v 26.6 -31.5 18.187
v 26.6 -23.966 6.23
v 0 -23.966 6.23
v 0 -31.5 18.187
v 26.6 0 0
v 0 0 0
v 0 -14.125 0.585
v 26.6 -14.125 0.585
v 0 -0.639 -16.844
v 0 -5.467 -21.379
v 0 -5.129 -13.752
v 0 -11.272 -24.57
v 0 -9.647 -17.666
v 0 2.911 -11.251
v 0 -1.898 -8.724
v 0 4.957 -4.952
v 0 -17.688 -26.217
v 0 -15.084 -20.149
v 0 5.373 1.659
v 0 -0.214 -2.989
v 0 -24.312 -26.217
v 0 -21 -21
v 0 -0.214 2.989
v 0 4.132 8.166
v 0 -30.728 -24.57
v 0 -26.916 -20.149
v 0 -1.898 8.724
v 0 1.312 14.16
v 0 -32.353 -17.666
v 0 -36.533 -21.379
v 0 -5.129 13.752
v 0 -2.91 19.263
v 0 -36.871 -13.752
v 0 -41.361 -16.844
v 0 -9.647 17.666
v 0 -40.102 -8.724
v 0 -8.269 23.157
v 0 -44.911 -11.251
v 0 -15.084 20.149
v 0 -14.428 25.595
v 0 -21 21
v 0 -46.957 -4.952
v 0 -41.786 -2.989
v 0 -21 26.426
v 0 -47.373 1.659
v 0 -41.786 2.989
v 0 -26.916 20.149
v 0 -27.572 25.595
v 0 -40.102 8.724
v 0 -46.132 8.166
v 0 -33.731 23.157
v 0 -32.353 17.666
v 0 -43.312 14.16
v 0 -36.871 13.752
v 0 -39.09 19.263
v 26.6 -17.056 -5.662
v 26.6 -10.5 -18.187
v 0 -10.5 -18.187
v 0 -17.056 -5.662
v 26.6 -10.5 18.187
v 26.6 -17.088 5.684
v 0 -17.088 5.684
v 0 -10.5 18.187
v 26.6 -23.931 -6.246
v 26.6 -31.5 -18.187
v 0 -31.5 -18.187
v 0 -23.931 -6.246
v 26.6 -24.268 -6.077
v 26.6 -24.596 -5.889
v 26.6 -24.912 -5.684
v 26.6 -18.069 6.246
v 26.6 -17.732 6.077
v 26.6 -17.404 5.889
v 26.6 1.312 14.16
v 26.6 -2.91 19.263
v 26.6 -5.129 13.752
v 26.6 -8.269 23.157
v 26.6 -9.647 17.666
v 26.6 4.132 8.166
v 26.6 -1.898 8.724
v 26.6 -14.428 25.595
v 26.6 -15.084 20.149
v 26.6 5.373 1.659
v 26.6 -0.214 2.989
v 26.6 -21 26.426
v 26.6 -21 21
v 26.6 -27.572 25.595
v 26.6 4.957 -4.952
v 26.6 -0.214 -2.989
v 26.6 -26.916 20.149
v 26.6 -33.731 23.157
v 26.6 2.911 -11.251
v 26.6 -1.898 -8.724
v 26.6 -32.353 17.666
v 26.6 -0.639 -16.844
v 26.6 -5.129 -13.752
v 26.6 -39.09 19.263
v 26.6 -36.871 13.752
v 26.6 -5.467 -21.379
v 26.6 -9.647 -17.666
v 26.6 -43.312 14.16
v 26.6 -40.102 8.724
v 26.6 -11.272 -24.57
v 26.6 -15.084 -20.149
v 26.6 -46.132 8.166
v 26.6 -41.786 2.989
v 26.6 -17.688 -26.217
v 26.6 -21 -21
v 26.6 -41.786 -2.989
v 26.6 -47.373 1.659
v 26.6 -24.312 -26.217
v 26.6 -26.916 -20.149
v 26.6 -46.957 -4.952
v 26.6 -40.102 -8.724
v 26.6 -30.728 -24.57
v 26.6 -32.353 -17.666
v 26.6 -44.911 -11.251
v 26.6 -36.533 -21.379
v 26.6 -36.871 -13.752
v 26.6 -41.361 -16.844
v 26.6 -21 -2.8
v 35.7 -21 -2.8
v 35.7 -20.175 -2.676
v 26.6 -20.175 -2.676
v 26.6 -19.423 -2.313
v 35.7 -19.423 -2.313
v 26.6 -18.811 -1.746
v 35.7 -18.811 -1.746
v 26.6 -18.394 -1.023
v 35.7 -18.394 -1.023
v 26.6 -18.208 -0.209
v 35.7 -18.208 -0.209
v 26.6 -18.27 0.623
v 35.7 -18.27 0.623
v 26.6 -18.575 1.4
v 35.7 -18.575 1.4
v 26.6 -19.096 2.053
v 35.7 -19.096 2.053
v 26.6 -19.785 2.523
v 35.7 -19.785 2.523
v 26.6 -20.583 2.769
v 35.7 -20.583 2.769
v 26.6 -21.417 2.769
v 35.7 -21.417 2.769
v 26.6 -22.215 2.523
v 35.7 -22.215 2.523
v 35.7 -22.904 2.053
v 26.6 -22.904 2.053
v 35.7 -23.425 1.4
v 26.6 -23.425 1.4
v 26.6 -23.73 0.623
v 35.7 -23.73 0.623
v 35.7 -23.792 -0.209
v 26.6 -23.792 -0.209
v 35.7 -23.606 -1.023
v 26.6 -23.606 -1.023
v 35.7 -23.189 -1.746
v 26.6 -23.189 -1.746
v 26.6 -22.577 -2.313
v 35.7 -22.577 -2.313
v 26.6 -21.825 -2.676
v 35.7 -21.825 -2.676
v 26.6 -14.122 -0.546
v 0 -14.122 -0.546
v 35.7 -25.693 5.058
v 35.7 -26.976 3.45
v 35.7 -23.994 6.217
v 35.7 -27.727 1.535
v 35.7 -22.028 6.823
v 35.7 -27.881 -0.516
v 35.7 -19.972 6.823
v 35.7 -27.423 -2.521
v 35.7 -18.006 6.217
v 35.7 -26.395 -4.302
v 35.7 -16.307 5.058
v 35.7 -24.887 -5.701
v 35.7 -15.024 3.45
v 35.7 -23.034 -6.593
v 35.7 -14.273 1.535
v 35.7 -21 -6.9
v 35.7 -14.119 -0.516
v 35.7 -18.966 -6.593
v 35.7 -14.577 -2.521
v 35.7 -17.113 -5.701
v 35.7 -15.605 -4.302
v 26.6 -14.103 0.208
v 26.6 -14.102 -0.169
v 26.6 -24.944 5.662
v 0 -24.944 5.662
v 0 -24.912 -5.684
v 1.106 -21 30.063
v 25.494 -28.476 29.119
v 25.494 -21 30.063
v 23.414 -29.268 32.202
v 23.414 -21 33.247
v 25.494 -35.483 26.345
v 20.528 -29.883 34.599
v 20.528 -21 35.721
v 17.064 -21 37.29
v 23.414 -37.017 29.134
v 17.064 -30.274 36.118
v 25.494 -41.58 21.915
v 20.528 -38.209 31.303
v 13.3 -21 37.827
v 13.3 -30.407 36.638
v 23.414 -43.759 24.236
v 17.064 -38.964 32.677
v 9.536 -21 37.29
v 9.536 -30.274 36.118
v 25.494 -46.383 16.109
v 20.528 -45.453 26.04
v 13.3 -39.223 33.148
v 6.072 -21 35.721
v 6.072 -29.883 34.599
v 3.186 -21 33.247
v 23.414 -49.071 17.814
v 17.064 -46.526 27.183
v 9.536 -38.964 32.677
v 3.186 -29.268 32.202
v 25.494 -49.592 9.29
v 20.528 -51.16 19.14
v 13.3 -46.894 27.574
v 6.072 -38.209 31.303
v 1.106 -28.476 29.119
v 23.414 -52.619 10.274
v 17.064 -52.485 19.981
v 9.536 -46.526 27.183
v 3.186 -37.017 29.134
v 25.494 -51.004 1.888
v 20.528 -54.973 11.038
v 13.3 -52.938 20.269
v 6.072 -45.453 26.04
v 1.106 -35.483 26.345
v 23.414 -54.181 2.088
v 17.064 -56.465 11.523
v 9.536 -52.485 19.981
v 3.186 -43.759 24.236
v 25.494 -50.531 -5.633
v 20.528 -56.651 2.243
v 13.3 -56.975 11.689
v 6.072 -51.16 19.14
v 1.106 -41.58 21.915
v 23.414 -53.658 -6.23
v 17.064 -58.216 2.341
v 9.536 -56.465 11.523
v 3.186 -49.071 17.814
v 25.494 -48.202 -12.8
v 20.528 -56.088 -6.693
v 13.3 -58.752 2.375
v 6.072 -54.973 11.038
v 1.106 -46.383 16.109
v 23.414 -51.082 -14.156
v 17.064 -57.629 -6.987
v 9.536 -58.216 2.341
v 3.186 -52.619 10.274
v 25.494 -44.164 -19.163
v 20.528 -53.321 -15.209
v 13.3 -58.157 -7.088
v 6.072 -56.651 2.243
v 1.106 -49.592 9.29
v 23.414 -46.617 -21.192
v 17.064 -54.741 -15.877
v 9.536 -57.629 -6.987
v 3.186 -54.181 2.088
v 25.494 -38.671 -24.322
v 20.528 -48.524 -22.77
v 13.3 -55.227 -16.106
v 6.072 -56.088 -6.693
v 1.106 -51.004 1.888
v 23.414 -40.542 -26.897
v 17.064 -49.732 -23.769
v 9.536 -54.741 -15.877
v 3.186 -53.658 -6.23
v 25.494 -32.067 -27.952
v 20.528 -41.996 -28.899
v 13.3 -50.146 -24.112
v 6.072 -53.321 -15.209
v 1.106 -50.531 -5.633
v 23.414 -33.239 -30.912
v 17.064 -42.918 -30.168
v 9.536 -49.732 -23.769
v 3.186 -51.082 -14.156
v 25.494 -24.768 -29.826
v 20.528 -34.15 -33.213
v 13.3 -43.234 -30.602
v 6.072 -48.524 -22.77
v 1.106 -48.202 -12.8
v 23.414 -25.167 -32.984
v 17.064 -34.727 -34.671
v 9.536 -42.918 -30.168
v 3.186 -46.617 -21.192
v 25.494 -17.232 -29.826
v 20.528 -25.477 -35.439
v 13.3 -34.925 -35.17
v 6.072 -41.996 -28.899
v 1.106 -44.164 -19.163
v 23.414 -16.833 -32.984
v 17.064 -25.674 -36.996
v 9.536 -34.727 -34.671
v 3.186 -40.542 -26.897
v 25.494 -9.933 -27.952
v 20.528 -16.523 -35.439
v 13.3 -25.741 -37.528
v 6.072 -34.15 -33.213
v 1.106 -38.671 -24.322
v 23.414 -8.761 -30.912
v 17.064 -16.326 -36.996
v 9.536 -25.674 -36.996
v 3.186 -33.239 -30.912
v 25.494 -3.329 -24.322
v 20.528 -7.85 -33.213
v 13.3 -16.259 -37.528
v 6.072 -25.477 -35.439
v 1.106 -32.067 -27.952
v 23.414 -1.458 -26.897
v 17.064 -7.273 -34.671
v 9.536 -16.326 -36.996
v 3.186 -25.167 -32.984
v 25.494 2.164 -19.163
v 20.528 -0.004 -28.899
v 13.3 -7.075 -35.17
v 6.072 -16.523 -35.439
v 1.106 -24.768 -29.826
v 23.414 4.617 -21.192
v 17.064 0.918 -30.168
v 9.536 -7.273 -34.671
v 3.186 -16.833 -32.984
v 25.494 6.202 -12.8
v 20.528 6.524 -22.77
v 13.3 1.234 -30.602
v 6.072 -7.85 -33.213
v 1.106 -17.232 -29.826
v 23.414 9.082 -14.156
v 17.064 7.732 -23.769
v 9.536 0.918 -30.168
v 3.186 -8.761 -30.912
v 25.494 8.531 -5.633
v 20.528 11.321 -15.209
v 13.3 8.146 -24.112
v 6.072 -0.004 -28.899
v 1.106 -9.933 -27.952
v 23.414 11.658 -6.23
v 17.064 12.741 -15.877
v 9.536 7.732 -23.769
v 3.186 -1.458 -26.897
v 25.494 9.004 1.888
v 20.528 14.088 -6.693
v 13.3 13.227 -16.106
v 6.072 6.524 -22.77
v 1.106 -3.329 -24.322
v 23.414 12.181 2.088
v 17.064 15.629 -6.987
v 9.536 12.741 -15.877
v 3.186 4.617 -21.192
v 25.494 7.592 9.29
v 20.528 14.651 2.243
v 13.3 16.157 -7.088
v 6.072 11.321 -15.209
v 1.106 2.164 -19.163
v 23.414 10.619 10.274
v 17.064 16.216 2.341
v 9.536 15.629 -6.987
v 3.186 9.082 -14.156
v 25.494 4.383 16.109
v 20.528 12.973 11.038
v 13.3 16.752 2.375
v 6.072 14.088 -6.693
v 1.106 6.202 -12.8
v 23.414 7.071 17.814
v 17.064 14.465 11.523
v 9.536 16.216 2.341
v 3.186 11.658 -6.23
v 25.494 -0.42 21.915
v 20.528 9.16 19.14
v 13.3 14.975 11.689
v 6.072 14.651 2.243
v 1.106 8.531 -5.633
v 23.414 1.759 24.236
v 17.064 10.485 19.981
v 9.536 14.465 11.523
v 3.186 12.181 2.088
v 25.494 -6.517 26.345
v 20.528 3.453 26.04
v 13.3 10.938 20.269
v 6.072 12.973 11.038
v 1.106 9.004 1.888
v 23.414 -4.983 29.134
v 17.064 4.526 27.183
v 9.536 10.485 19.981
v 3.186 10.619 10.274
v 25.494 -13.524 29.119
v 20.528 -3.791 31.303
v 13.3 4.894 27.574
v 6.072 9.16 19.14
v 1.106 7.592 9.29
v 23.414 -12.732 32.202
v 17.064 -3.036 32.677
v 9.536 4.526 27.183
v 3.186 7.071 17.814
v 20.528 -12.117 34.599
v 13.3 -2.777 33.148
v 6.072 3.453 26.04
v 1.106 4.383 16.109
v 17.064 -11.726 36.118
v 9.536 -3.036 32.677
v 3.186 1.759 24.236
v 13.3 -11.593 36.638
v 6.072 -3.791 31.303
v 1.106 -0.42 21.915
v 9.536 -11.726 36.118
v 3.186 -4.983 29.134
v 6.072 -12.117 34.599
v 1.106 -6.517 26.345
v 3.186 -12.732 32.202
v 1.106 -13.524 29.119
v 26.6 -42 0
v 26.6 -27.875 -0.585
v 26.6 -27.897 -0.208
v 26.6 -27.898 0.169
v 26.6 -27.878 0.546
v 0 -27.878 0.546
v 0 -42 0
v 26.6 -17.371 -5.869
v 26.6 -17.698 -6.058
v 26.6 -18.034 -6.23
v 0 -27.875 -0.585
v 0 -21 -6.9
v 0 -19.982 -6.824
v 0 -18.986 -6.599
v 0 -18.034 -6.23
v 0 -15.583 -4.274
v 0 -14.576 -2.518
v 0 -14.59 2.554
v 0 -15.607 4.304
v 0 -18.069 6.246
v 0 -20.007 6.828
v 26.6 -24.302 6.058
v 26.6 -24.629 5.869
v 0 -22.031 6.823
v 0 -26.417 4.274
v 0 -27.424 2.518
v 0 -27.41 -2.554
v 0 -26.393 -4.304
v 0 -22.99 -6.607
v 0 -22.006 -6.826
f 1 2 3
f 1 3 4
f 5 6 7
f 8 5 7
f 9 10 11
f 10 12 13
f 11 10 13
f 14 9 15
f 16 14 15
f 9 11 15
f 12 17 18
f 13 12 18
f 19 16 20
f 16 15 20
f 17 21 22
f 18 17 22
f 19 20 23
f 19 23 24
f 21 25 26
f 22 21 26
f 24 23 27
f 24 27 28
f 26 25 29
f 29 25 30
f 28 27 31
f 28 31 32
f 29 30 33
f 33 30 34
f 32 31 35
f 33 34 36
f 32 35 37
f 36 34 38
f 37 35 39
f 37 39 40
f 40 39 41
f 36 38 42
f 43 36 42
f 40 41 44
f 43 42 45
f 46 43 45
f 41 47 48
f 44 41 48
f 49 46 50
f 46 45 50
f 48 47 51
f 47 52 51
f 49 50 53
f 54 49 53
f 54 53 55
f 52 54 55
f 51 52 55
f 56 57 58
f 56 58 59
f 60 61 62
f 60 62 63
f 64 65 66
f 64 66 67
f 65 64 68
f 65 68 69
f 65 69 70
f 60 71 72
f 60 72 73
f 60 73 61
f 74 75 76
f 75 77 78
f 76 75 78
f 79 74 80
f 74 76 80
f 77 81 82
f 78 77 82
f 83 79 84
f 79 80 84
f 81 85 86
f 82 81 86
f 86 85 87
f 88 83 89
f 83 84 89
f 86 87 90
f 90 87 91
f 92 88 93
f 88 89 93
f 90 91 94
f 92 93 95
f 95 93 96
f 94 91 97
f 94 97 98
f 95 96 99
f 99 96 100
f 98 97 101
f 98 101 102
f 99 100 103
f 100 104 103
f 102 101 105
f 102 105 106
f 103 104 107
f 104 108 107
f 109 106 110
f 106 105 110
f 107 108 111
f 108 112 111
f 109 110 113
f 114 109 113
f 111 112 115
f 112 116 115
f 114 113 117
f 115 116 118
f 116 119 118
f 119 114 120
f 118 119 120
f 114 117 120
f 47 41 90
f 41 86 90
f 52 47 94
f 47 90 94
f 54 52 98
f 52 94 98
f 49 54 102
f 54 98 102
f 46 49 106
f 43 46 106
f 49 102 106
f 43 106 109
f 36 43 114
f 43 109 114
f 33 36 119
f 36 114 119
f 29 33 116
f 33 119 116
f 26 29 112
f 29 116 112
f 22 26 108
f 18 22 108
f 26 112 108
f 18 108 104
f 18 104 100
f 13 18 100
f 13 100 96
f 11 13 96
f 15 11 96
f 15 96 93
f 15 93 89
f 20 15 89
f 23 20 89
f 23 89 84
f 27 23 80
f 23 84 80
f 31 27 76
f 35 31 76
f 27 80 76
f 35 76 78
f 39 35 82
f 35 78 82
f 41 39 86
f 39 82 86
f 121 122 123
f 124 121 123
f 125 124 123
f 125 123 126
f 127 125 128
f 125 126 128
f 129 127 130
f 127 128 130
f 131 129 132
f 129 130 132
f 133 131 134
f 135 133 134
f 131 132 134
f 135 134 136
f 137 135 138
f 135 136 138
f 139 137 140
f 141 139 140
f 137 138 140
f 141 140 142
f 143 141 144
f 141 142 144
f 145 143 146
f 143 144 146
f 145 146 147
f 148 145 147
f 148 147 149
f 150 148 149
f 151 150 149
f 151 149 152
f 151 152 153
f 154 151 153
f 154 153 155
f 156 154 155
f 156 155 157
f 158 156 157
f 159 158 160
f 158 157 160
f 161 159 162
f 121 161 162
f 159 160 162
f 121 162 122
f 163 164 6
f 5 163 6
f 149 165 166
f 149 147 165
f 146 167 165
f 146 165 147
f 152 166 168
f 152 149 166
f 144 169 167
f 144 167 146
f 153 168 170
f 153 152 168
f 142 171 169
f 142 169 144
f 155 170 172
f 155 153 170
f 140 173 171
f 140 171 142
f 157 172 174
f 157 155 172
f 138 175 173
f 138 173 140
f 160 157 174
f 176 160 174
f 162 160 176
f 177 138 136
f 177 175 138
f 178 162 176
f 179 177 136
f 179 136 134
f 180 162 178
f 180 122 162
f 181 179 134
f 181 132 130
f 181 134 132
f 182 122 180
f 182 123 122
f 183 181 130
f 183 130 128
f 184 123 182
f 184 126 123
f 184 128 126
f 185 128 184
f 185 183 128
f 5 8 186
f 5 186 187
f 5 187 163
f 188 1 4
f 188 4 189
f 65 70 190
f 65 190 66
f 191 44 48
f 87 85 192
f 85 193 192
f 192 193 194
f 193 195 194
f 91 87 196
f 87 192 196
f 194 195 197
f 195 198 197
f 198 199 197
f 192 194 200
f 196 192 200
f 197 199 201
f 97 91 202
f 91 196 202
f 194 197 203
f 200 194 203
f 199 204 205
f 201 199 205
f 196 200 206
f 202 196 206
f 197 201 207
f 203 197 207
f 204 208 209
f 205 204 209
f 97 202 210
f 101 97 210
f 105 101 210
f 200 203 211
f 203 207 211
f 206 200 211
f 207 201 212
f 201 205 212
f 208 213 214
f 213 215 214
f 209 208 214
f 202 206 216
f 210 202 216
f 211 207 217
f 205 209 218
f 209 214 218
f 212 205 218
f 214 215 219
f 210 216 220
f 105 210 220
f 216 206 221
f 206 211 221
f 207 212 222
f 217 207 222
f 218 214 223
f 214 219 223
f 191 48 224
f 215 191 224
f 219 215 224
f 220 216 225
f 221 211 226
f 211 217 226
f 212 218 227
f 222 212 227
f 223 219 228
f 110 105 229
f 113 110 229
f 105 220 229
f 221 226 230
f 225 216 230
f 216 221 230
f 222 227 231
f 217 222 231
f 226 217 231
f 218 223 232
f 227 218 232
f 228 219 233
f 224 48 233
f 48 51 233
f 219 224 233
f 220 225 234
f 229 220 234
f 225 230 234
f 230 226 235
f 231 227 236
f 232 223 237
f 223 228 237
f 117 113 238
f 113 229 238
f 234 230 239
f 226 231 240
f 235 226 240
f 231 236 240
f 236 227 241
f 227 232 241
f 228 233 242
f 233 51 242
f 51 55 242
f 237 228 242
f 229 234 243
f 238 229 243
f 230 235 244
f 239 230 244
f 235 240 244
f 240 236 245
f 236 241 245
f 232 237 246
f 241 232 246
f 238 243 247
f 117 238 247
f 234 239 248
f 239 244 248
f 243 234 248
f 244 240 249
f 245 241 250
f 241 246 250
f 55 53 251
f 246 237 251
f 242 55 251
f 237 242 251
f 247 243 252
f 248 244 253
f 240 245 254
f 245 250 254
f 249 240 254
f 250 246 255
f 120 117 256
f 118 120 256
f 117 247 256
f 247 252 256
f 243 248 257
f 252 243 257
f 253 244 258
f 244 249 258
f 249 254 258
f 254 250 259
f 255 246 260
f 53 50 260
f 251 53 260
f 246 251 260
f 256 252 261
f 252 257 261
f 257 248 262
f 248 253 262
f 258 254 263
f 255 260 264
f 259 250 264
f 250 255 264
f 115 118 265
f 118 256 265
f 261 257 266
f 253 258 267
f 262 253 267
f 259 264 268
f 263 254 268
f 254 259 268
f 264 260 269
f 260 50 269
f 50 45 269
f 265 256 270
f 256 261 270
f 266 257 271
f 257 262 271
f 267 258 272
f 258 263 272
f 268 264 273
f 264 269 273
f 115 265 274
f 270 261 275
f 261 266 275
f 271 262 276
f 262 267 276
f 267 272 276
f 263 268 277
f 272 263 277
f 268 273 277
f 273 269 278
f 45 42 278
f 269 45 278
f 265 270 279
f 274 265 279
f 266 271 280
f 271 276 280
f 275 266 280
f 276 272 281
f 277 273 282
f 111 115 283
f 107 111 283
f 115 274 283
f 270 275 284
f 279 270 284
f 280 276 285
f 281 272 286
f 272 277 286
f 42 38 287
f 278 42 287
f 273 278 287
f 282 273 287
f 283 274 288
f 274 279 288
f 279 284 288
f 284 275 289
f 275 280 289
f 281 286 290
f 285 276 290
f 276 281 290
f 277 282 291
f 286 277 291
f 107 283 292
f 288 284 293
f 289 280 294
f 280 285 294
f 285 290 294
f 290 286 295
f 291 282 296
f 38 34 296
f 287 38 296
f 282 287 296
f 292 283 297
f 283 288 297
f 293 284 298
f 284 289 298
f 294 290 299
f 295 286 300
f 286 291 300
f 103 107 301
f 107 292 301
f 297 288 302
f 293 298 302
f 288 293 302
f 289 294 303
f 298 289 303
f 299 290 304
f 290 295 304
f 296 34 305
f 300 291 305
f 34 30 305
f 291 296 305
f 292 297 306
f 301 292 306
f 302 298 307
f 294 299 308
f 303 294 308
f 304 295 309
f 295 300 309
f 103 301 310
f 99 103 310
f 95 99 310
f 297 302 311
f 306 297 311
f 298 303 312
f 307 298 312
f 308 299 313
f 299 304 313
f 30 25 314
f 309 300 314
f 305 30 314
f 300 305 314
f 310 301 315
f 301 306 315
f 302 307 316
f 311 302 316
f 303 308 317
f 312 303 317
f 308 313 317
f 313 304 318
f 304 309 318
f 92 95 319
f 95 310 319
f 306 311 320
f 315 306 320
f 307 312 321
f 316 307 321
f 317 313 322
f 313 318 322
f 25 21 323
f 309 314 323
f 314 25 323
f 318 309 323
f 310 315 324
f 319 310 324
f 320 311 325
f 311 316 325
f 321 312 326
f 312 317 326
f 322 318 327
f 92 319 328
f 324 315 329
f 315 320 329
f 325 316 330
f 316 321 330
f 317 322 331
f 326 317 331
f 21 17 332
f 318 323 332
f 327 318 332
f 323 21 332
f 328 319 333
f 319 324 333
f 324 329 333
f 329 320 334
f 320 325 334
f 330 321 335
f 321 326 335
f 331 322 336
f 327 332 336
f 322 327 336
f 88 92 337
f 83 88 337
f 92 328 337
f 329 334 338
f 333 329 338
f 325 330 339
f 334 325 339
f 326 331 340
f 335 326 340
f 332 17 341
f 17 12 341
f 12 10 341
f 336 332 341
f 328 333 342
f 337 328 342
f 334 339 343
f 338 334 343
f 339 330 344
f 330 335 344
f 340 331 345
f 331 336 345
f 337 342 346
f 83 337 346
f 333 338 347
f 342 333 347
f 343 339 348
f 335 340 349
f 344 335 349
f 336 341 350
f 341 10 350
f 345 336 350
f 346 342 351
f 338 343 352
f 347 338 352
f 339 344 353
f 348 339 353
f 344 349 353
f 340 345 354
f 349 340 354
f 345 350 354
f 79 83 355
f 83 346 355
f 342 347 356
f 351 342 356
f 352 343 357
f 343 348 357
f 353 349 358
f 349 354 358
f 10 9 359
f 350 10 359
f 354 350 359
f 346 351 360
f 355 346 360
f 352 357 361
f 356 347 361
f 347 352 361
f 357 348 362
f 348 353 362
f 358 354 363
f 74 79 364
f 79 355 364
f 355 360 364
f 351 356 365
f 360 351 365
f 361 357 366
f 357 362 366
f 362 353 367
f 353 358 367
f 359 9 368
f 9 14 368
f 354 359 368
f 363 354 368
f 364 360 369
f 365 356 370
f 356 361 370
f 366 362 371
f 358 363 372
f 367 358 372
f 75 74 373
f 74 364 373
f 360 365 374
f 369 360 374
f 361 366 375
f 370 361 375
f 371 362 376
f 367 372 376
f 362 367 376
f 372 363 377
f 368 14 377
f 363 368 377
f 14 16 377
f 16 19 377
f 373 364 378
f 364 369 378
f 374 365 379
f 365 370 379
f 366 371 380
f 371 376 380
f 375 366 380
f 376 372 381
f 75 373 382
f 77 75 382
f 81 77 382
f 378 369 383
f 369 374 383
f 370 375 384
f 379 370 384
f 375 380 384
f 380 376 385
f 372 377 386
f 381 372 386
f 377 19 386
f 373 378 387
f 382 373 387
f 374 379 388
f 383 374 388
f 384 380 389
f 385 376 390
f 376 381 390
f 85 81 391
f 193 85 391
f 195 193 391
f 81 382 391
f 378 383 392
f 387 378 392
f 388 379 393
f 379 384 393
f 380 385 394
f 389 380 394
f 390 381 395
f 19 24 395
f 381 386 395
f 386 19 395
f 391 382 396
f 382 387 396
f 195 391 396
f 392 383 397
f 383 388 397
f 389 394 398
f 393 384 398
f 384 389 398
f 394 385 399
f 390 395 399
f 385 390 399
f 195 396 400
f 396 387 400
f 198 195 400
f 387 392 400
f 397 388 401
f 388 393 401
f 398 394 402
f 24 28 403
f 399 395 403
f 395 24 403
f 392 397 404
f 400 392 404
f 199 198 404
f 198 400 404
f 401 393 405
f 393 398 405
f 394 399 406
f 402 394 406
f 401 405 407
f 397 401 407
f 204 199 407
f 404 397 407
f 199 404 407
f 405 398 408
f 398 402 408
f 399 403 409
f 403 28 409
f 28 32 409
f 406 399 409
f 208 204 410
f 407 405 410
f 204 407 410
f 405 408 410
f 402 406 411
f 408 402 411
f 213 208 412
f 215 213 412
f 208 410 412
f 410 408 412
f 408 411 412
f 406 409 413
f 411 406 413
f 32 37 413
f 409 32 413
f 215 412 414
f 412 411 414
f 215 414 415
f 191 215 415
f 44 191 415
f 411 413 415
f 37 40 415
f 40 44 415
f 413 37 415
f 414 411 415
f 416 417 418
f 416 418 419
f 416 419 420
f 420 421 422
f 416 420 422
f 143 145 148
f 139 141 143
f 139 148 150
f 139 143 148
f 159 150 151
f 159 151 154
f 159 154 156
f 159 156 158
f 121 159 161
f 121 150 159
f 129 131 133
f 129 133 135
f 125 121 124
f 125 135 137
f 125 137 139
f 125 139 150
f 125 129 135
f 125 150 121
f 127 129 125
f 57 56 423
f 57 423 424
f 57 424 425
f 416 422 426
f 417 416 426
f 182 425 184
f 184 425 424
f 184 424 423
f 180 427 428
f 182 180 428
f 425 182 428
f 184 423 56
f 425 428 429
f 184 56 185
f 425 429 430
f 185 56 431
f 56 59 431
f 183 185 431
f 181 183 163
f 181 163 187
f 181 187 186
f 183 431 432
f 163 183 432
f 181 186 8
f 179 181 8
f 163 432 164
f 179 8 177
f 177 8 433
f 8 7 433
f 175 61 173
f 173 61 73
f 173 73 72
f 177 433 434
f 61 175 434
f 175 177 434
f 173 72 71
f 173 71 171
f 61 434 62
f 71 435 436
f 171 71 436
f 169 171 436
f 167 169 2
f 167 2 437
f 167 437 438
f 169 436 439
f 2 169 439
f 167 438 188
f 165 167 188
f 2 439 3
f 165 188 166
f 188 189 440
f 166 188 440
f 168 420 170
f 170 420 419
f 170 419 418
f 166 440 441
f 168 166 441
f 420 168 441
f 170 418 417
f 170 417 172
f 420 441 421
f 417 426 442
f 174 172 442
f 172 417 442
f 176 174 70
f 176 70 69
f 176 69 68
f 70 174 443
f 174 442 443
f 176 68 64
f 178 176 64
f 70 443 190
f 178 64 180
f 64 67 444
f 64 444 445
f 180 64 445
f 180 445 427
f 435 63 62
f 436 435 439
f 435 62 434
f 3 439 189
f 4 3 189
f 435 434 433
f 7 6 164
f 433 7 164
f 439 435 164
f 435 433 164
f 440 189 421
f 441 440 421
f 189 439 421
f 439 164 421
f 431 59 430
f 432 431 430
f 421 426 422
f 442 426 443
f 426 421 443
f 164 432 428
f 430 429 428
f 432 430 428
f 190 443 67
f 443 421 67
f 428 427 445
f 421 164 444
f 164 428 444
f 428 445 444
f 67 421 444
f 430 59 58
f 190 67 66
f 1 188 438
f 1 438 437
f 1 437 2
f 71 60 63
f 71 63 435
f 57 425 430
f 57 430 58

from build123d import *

# Parameters (mm, degrees)
BOSS_EXTRUDE1_DEPTH      = 9.1
BOSS_EXTRUDE1_DEPTH_BACK = 26.6
SKETCH13_R               = 6.9
SKETCH14_R               = 2.8
CUT_EXTRUDE1_DEPTH       = 9.1
BOSS_EXTRUDE2_DEPTH      = 26.6
CIRPATTERN1_COUNT        = 6


with BuildPart() as part:
    # Sketch1 → Revolve10 (revolve)
    with BuildSketch(Plane.XY, mode=Mode.PRIVATE) as revolve10_sk:
        with BuildLine():
            Line((0, 0), (26.6, 0))
            Line((26.6, 0), (26.6, 5.425523727))
            ThreePointArc((26.6, 5.425523727), (13.3, 16.826691133), (0, 5.425523727))
            Line((0, 5.425523727), (0, 0))
        make_face()
    revolve(revolve10_sk.sketch.rotate(Axis((-4.739866393, -21, 0), (1, 0, 0)), 90), axis=Axis((-4.739866393, -21, 0), (1, 0, 0)))


with BuildPart() as body_2:
    # Sketch13 → Boss-Extrude1 (new, two sides: drawn at the far end of the back side and taken through both)
    with BuildSketch(Plane(origin=(26.6, 0, 0), x_dir=(0, 0, -1), z_dir=(1, 0, 0)).offset(-BOSS_EXTRUDE1_DEPTH_BACK)):
        with Locations((0, -21)):
            Circle(SKETCH13_R)
    extrude(amount=BOSS_EXTRUDE1_DEPTH + BOSS_EXTRUDE1_DEPTH_BACK)

    # Sketch14 → Cut-Extrude1 (cut)
    with BuildSketch(Plane(origin=(35.7, 0, 0), x_dir=(0, 0, -1), z_dir=(1, 0, 0))):
        with Locations((0, -21)):
            Circle(SKETCH14_R)
    extrude(amount=-CUT_EXTRUDE1_DEPTH, mode=Mode.SUBTRACT)

    # Sketch16 → Boss-Extrude2 (add)
    with BuildSketch(Plane(origin=(26.6, 0, 0), x_dir=(0, 0, -1), z_dir=(1, 0, 0))):
        with BuildLine():
            Line((0, 0), (-0.585969551, -14.158107951))
            ThreePointArc((-0.585969551, -14.158107951), (-0.019243844, -14.133749454), (0.547481863, -14.158107951))
            Line((0.547481863, -14.158107951), (0, 0))
        make_face()
    boss_extrude2 = extrude(amount=-BOSS_EXTRUDE2_DEPTH)

    # CirPattern1: Boss-Extrude2 ×6 about axis
    cirpattern1_axis = Axis((0, -21, 0), (1, 0, 0))
    for i in range(1, CIRPATTERN1_COUNT):
        add(boss_extrude2.rotate(cirpattern1_axis, i * 360 / CIRPATTERN1_COUNT))


solid = Compound([part.part, body_2.part])
